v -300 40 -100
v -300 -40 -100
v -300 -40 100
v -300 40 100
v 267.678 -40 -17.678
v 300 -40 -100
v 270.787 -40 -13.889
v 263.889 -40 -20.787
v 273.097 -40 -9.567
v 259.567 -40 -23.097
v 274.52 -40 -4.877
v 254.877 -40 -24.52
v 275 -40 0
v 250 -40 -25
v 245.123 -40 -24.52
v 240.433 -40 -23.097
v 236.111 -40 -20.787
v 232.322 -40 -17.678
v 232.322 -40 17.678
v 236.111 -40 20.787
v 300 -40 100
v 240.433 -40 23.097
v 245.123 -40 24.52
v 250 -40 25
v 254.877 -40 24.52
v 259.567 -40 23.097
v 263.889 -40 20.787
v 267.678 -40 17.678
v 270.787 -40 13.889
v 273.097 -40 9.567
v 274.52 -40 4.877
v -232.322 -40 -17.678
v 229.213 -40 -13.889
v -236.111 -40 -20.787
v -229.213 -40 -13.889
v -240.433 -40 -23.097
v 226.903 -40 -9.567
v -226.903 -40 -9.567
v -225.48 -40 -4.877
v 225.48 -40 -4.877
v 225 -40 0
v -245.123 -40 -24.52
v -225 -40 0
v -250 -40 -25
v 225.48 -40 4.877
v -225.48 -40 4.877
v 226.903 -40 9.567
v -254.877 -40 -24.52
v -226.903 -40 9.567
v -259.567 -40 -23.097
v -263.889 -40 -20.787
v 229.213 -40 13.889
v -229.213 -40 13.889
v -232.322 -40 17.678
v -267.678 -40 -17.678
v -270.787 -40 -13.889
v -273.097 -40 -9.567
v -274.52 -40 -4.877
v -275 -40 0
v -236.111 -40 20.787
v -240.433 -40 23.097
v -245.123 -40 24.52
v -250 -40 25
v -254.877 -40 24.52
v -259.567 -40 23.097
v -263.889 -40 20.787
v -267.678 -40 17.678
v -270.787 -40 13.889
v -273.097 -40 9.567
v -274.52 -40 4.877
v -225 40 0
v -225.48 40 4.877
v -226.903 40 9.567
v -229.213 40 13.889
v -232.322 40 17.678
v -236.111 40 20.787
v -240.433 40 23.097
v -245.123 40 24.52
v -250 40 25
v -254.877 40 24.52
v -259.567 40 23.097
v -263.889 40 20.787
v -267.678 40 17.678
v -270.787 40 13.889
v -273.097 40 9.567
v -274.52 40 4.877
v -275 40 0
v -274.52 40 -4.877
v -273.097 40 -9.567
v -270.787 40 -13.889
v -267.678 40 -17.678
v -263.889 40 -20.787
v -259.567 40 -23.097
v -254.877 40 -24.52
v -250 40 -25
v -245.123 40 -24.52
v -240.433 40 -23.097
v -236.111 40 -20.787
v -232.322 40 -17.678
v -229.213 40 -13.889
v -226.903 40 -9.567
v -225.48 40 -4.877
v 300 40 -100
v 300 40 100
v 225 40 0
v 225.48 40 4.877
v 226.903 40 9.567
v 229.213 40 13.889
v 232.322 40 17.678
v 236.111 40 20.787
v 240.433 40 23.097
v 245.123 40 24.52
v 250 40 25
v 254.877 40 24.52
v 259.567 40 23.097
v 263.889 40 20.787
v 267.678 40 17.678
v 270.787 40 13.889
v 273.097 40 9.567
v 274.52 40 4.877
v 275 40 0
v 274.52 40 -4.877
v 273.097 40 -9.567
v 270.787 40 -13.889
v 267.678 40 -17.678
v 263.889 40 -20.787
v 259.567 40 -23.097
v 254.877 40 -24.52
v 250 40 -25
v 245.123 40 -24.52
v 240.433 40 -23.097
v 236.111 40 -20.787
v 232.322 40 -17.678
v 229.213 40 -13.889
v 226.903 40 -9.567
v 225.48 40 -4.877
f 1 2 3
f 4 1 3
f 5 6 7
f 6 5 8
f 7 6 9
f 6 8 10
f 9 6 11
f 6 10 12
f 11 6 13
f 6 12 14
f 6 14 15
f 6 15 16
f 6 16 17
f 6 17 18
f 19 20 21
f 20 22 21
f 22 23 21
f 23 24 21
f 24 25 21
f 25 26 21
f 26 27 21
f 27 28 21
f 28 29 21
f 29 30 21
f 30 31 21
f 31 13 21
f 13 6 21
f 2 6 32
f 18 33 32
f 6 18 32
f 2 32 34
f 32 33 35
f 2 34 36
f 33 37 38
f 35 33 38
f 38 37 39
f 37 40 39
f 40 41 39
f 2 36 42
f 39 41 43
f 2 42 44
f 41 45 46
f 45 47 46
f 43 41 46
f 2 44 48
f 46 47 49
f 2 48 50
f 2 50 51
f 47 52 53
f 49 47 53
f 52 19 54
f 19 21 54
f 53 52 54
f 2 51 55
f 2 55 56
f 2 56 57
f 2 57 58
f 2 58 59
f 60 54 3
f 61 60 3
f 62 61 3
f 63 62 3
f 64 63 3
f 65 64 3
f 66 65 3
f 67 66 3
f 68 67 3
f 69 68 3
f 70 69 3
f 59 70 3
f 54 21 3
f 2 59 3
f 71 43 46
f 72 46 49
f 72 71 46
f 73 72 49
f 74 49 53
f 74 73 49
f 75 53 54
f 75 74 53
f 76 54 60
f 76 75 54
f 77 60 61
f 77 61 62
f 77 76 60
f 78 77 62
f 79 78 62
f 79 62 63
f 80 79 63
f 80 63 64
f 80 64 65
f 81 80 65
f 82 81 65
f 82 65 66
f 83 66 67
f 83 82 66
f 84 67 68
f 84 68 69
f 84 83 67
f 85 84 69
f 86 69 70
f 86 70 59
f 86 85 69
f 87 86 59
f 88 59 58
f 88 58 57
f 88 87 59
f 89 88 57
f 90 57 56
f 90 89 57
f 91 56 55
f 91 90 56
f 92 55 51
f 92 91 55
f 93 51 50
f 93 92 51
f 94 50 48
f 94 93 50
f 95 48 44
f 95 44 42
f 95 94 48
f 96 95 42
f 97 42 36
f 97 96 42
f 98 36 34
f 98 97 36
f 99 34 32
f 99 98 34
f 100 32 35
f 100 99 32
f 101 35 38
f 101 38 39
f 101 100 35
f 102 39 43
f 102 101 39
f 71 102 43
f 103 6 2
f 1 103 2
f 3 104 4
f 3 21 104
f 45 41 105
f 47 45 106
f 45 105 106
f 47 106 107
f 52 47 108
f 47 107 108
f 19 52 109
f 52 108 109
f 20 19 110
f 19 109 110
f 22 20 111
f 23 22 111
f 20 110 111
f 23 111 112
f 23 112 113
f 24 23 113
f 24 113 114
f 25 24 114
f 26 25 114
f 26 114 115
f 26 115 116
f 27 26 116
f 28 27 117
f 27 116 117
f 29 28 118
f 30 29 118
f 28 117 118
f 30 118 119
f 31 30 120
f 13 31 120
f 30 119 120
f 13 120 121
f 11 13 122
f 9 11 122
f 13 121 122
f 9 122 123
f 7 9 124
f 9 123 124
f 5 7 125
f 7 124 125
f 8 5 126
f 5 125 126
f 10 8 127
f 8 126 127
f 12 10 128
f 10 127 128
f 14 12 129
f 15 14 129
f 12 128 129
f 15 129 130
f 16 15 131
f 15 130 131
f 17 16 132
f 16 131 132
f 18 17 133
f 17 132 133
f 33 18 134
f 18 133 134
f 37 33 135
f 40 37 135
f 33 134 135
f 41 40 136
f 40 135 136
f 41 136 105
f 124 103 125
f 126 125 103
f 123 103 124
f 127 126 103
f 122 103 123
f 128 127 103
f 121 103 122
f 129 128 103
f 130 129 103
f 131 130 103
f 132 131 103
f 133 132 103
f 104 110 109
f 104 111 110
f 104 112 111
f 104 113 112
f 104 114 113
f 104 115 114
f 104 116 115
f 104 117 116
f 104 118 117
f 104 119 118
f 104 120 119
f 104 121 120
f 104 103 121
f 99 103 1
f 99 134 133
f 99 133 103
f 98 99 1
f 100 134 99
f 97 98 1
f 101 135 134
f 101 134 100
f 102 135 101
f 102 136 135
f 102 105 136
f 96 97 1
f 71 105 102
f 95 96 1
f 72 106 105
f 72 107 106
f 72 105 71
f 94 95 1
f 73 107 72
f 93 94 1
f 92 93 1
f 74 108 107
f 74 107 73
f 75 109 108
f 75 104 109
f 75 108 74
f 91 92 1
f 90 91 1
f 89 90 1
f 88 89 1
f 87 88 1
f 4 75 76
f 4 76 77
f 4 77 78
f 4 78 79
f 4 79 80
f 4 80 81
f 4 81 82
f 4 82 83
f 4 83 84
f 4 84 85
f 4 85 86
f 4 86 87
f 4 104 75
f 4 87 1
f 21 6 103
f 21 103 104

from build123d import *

# Parameters (mm, degrees)
F0_W     = 300
F0_H     = 200
F0_R     = 25
F1_DEPTH = 40


with BuildPart() as f1:
    # F0 (on Front) → F1 (new body, symmetric)
    with BuildSketch(Plane.XZ):
        with Locations((-150, 0)):
            Rectangle(F0_W, F0_H)
        with Locations((-250, 0)):
            Circle(F0_R, mode=Mode.SUBTRACT)
    extrude(amount=F1_DEPTH, both=True)

    # F4: F1 across face


with BuildPart() as f2_1:
    # F2: instance of F1
    add(f1.part.mirror(Plane.YZ))


with BuildPart() as f1_1:
    add(f1.part)
    add(f1.part.mirror(Plane.YZ))


solid = f1_1.part
